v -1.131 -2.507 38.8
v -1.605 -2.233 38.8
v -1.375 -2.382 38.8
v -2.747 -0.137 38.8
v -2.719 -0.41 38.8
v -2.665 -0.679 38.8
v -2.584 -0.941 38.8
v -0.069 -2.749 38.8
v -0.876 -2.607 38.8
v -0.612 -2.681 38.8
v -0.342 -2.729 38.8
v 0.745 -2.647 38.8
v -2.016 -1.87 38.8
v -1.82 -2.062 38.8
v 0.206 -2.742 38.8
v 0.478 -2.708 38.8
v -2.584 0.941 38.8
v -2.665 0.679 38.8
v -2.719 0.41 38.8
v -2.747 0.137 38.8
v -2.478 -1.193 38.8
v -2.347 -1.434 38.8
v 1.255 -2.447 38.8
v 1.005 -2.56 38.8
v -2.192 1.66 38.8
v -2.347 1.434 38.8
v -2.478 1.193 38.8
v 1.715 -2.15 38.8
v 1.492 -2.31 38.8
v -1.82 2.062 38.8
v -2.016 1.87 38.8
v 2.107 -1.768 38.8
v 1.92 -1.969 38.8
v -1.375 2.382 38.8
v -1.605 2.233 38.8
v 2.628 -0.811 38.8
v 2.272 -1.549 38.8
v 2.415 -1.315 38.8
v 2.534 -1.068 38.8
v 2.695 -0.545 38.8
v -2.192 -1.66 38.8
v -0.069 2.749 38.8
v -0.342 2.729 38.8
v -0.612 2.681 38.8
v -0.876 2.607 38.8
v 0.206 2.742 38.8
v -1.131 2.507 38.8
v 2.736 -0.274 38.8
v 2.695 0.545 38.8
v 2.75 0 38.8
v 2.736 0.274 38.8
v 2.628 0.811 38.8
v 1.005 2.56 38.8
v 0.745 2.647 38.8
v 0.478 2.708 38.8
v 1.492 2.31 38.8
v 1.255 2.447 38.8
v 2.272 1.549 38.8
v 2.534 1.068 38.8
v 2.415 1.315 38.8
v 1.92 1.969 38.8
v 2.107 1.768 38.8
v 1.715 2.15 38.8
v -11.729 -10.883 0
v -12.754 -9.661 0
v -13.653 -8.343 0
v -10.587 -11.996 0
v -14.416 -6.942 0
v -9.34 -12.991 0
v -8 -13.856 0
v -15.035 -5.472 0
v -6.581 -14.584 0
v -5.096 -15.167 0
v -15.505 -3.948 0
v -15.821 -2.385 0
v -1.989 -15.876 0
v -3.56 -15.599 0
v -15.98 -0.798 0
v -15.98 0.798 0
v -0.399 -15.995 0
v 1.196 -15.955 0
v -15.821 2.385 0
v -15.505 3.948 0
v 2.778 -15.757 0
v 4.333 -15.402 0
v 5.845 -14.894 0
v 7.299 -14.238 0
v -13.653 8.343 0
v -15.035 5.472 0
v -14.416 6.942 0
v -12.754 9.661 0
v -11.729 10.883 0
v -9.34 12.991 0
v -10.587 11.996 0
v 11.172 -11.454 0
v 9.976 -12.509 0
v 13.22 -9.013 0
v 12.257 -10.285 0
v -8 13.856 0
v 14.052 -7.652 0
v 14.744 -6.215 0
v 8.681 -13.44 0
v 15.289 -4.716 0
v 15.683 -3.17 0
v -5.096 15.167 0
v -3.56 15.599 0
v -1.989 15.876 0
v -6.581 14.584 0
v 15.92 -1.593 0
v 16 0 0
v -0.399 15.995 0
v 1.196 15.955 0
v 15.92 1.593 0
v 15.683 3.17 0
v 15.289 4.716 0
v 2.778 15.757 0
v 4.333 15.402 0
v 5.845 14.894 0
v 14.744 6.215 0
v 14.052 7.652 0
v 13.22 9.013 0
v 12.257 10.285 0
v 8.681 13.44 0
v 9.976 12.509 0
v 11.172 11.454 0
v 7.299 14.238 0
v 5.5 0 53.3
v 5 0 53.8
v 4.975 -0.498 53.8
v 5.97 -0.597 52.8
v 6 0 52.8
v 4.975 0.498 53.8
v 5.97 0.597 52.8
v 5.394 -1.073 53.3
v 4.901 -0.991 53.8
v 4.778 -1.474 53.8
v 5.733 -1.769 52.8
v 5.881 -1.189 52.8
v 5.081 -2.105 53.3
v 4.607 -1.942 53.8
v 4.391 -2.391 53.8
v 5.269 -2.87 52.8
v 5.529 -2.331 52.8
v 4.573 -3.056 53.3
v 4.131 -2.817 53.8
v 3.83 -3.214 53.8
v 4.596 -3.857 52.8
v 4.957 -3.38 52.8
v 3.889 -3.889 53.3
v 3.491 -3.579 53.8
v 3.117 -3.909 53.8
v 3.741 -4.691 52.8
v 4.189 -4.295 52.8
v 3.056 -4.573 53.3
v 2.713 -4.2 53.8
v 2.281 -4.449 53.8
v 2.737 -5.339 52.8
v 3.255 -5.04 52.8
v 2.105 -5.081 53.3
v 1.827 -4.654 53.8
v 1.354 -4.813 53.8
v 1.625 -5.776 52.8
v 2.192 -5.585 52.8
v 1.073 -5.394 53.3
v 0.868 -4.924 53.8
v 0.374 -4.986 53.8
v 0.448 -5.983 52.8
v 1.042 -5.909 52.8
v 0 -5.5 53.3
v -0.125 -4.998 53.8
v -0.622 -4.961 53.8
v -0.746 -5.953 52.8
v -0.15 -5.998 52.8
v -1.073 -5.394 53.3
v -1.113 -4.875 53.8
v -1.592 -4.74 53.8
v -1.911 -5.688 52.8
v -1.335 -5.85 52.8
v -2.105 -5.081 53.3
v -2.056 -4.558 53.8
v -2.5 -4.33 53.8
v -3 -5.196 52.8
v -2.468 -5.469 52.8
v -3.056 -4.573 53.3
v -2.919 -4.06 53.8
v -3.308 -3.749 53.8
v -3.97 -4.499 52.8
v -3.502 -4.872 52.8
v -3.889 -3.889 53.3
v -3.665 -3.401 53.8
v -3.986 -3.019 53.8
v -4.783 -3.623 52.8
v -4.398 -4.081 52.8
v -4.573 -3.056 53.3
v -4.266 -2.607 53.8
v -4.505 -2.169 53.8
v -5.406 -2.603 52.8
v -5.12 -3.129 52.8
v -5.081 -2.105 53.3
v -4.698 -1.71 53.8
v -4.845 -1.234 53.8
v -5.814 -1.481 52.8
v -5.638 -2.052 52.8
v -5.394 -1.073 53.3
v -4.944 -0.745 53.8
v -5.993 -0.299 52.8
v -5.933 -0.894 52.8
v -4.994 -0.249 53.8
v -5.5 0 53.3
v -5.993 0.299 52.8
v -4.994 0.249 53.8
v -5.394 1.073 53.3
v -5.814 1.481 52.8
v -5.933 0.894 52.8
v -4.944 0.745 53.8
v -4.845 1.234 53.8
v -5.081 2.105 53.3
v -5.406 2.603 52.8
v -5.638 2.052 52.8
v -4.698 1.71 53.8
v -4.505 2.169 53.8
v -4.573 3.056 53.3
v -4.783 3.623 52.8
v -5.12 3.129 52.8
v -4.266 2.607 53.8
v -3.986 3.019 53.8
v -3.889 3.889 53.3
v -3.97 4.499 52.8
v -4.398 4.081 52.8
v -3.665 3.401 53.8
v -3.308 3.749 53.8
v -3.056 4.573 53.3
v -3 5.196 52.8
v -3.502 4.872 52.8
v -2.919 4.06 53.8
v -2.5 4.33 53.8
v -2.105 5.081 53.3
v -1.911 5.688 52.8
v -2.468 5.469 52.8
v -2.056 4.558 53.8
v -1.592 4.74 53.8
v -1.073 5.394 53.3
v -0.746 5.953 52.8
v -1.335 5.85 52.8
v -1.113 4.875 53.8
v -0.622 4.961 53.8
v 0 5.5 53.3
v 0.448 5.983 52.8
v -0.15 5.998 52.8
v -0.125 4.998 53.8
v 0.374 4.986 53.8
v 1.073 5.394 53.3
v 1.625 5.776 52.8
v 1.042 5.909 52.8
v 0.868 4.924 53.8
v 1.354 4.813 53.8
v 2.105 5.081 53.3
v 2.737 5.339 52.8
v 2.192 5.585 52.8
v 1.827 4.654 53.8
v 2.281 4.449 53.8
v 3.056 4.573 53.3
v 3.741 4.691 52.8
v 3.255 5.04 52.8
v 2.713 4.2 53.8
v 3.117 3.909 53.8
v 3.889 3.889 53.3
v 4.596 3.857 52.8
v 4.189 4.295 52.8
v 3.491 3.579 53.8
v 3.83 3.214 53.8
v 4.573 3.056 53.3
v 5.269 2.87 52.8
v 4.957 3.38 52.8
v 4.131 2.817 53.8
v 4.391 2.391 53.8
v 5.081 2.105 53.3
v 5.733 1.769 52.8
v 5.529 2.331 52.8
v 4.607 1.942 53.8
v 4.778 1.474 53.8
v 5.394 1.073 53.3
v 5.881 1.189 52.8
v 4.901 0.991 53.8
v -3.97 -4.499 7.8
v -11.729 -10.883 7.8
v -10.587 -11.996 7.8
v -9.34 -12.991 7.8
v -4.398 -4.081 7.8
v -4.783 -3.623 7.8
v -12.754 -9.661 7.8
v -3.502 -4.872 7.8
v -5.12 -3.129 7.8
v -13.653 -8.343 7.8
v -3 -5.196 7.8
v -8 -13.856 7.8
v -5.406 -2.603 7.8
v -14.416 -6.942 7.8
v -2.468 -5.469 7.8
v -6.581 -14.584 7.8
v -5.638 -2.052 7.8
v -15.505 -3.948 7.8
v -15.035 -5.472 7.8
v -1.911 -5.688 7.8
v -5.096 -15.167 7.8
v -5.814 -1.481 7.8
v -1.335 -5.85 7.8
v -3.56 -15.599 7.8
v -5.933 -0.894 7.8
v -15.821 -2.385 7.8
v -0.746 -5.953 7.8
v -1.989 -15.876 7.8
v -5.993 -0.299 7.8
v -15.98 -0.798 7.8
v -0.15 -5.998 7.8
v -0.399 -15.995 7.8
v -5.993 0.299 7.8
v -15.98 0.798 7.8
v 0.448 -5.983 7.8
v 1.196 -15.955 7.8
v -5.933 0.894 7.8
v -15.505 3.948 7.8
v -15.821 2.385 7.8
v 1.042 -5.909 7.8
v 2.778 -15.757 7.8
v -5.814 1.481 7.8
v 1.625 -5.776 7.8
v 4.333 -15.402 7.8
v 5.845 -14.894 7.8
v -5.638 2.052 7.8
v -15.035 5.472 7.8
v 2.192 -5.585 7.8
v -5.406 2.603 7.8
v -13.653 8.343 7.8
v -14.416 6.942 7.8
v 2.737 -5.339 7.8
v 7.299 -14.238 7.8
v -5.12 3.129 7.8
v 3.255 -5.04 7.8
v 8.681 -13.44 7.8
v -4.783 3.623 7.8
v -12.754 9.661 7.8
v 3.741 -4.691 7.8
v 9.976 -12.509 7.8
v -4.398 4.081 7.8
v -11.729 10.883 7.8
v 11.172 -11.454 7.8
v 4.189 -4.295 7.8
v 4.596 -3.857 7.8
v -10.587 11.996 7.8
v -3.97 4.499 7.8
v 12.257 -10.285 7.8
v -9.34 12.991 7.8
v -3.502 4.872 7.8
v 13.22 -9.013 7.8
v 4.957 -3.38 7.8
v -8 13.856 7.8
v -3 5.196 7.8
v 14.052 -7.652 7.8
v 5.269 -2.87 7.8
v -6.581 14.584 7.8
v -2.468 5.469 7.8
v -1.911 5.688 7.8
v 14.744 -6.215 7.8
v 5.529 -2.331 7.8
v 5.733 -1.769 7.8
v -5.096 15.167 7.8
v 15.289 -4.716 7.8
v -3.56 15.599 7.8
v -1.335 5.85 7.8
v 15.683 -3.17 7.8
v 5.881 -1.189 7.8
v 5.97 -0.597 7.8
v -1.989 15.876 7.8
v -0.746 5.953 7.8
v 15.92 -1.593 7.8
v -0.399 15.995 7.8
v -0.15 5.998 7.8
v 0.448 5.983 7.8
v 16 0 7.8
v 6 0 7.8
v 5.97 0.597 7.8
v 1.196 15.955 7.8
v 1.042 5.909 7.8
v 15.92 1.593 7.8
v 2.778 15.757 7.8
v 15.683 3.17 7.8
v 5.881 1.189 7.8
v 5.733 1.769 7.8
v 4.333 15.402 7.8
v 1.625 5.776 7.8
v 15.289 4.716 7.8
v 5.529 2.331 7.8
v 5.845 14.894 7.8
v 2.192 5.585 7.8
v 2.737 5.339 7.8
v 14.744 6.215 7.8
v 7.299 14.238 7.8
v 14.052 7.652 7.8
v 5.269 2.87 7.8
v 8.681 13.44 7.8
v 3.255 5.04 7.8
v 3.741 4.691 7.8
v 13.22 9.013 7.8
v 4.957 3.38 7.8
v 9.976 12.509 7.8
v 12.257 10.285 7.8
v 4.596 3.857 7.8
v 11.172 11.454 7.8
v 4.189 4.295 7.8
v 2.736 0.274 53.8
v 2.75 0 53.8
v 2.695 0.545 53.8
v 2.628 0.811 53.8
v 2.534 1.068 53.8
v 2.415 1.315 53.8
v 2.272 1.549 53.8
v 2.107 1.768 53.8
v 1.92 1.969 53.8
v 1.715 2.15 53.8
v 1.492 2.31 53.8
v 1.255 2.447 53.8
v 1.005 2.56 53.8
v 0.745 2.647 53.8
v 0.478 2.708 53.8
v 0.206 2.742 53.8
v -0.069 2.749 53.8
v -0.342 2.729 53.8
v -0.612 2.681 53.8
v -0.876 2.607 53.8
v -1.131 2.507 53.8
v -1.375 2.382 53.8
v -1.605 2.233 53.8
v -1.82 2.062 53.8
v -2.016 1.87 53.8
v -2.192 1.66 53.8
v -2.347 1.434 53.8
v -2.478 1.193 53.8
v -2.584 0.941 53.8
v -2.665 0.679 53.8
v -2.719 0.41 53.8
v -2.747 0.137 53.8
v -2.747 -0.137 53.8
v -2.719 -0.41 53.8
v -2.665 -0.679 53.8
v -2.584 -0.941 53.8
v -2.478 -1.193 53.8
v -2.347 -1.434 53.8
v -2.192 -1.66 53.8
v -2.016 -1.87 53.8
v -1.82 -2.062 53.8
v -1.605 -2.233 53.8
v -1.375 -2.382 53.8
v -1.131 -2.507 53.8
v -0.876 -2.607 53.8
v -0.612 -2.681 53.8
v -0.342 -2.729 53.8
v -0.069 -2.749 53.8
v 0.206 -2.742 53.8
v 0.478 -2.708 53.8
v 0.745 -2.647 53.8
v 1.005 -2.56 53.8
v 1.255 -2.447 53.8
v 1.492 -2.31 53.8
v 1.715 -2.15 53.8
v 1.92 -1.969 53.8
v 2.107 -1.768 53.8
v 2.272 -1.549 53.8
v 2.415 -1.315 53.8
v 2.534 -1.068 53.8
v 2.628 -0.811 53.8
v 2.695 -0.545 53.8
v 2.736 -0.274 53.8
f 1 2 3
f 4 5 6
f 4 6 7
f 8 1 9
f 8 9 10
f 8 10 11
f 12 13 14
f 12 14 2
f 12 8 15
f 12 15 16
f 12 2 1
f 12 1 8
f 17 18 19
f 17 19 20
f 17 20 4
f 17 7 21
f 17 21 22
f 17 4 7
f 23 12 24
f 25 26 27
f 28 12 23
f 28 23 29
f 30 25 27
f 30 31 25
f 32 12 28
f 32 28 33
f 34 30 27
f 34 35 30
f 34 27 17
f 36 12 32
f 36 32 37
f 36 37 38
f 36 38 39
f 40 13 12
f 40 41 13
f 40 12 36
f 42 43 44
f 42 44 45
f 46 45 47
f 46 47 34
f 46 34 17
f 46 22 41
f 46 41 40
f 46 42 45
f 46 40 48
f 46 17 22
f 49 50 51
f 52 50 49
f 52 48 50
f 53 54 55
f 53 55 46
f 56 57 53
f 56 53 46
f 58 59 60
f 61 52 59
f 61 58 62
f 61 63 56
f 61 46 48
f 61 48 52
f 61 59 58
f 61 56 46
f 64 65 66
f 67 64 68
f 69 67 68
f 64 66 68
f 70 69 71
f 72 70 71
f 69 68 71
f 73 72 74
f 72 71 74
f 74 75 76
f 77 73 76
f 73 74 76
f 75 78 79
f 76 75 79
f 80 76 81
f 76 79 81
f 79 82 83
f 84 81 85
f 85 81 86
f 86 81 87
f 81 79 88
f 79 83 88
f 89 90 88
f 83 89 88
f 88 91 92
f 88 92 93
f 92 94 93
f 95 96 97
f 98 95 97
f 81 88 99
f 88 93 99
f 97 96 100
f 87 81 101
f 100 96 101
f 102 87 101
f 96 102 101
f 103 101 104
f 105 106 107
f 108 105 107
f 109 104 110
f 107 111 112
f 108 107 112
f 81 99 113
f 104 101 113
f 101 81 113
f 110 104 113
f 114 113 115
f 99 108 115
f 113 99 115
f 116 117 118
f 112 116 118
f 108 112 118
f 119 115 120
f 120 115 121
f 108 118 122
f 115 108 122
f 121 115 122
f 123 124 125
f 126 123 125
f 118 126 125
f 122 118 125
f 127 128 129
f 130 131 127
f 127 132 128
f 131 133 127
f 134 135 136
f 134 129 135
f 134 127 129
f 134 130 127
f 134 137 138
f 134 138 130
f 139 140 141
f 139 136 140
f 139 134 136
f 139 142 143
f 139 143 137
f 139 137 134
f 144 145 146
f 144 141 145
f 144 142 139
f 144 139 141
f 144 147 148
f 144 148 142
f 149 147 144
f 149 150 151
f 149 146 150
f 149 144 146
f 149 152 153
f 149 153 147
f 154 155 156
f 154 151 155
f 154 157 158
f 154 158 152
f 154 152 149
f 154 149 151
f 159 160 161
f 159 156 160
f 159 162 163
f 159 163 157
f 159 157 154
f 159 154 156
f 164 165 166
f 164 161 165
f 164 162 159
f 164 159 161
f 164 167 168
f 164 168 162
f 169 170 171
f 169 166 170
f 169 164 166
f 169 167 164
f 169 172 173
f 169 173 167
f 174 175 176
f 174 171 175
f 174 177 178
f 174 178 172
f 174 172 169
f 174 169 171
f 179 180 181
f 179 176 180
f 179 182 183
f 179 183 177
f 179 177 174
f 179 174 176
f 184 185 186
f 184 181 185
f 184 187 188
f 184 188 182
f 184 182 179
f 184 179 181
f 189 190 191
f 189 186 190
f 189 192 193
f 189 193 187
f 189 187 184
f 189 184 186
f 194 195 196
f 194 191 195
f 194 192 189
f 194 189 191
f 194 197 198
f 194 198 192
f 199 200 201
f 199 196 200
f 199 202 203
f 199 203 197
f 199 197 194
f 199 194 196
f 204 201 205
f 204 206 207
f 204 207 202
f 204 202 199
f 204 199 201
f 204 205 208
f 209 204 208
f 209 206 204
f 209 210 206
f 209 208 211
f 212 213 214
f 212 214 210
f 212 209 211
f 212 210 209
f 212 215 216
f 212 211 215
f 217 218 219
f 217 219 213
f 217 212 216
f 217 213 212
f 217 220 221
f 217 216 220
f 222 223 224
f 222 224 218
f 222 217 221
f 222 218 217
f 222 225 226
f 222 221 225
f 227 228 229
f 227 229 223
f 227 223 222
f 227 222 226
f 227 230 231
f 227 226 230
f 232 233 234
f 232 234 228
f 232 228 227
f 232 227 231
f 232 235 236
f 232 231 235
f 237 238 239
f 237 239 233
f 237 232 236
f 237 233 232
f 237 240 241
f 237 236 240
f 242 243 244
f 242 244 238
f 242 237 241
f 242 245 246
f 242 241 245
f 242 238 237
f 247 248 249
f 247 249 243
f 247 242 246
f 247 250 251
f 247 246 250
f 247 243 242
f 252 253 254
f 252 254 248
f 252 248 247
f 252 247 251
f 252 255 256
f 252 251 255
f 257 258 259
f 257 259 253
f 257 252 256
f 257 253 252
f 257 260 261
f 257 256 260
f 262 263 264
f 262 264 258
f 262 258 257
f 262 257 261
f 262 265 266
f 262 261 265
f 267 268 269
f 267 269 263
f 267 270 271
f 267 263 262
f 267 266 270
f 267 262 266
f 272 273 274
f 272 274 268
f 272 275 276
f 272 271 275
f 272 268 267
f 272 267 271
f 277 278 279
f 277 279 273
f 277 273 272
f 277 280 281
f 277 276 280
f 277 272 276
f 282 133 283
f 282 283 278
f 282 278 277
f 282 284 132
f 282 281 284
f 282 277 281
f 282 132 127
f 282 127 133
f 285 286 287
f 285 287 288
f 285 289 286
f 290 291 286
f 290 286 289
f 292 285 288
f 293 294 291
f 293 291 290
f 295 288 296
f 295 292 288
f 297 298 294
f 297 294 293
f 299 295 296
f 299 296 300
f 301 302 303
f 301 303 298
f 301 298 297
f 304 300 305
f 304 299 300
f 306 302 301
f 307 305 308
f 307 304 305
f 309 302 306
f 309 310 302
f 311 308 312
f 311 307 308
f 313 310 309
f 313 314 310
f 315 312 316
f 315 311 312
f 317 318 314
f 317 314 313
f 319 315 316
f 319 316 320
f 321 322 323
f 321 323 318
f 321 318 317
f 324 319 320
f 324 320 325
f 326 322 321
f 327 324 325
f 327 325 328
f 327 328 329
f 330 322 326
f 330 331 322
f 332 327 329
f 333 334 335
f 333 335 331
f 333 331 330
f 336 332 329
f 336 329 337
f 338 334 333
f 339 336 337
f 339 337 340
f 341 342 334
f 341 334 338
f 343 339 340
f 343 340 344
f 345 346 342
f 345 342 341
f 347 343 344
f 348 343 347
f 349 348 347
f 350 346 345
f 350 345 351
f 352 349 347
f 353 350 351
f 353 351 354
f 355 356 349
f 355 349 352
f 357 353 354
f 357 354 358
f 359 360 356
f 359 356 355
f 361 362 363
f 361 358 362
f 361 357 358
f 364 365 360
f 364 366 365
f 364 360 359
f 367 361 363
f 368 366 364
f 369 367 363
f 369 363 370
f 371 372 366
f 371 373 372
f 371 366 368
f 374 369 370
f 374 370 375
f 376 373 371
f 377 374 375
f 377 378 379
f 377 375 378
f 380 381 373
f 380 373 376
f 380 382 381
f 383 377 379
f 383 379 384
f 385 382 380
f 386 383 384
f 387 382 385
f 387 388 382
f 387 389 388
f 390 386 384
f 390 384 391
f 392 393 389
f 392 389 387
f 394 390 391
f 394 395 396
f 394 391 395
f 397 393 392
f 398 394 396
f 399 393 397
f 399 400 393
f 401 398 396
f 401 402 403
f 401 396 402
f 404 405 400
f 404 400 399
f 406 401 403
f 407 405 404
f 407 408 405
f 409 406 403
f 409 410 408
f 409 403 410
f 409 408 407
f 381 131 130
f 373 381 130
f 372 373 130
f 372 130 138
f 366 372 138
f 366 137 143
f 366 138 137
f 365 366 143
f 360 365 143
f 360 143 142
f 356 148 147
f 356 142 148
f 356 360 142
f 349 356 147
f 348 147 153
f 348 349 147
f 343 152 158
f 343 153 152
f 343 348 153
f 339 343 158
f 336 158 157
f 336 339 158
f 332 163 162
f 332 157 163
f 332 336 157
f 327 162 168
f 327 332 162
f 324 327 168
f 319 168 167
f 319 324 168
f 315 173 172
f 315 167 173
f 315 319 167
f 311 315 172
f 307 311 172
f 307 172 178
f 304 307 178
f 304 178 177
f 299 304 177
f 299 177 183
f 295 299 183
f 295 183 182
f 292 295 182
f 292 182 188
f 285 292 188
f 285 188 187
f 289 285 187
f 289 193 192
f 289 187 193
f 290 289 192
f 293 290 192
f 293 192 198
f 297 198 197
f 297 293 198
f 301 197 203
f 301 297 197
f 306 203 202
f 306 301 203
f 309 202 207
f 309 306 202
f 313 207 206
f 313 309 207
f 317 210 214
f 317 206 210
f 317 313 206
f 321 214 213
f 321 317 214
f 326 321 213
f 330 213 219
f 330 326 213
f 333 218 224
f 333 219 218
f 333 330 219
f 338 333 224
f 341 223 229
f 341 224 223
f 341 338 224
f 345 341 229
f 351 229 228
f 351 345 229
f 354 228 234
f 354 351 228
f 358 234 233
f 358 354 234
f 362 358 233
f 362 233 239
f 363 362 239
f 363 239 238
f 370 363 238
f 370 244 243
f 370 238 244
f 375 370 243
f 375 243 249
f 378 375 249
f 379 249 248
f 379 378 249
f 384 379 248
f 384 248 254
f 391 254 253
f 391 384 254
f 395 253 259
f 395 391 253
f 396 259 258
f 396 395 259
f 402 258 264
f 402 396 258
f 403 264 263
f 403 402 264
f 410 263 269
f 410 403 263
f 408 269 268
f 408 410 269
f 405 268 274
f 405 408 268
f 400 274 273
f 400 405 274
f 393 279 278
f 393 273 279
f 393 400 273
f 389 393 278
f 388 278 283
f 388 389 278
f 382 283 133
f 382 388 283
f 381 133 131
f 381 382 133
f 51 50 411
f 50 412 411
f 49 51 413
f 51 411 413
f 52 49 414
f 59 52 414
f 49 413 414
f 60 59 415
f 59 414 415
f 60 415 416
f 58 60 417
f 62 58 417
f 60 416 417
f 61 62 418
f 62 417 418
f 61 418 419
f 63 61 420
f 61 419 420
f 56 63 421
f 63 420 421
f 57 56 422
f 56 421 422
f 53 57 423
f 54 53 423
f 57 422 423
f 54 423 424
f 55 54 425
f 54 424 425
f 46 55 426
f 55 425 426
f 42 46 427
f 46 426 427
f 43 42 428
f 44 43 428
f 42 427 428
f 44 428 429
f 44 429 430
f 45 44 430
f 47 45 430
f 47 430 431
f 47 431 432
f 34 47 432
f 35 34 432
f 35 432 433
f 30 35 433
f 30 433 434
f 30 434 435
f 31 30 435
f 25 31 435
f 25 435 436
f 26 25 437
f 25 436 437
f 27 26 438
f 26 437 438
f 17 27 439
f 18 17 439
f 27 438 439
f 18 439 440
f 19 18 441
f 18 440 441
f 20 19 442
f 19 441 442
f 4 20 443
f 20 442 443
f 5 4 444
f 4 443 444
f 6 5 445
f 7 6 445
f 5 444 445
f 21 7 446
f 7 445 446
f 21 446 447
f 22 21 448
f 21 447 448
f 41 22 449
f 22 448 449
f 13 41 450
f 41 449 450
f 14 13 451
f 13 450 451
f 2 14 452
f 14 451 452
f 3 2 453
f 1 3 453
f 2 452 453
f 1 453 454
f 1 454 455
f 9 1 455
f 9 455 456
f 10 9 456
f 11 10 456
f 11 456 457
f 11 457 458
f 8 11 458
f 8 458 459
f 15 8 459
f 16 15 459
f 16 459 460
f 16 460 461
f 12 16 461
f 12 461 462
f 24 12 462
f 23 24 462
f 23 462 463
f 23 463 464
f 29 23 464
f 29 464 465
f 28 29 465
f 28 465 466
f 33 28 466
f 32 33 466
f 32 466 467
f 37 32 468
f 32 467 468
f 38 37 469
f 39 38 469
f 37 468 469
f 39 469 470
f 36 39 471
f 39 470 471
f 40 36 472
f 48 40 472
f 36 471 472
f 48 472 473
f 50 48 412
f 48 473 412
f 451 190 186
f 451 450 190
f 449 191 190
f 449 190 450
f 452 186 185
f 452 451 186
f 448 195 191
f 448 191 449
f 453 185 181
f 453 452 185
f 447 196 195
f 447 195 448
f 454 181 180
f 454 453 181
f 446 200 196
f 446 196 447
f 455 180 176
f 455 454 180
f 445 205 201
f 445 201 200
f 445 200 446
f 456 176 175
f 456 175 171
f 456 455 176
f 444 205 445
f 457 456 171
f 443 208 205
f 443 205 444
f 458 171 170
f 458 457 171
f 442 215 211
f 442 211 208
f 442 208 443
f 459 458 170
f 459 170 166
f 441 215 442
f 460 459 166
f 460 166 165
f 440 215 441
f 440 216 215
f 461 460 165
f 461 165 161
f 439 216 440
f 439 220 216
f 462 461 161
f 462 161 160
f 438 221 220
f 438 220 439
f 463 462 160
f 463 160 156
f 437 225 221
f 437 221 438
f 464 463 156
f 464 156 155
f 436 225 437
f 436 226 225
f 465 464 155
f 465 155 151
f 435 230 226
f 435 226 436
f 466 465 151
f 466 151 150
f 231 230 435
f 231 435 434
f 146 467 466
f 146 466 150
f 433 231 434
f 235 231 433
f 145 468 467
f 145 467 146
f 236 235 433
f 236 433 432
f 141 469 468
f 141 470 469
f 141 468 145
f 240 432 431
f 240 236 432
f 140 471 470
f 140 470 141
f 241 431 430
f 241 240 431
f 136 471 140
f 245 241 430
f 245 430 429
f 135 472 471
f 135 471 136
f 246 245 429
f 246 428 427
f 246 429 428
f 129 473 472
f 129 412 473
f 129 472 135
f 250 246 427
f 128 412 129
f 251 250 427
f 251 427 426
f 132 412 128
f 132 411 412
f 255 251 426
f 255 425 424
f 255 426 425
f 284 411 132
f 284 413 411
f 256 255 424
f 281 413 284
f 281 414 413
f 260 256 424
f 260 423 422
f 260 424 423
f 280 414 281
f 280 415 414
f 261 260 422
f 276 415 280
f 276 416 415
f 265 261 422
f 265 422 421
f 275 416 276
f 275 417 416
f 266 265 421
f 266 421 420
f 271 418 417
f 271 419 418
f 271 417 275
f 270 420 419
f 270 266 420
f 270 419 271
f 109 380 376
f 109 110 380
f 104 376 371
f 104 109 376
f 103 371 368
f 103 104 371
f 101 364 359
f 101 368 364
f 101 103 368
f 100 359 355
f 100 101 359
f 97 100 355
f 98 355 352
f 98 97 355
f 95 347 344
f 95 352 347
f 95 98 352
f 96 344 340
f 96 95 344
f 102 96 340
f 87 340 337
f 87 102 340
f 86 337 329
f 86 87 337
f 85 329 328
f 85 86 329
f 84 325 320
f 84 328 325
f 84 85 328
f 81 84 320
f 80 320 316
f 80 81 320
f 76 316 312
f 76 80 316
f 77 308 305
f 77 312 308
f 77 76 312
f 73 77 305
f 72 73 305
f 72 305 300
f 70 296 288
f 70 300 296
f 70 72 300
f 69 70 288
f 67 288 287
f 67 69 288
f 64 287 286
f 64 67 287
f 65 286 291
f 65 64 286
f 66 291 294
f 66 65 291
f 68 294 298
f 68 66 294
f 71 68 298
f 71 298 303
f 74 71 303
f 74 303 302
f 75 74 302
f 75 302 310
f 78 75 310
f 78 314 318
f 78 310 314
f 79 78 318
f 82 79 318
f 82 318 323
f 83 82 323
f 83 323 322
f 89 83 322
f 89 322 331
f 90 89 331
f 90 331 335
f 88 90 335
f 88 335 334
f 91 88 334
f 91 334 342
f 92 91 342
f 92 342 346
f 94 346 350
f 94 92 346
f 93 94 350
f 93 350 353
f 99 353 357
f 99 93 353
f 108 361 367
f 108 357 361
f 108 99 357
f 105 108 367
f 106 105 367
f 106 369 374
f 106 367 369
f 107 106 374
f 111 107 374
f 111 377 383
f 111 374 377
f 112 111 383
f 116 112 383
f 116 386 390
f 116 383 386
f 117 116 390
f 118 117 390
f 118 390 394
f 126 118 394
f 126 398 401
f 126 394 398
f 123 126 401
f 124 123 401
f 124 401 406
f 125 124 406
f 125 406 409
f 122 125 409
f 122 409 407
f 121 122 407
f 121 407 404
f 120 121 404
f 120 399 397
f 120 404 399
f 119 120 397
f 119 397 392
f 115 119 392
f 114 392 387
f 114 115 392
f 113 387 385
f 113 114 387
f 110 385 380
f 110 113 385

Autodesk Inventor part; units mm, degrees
ref_plane "YZ Plane" through (0, 0, 0) normal (1, 0, 0) x (0, 1, 0)
ref_plane "XZ Plane" through (0, 0, 0) normal (0, 1, 0) x (-1, 0, 0)
ref_plane "XY Plane" through (0, 0, 0) normal (0, 0, 1) x (1, 0, 0)
sketch "Sketch1" plane through (0, 0, 0) normal (0, 0, 1) x (1, 0, 0)
  circle A0 centre (0, 0) radius 16
  dimension "d0" = 32
extrude "Extrusion1" add sketch "Sketch1" along normal blind 7.8
sketch "Sketch2" plane through (0, 0, 7.8) normal (0, 0, 1) x (1, 0, 0)
  circle A0 centre (0, 0) radius 16 projected
  circle A1 centre (0, 0) radius 6
  dimension "d3" = 12
extrude "Extrusion2" add sketch "Sketch2" along normal blind 46 contours A1
sketch "Sketch3" plane through (0, 0, 53.8) normal (0, 0, 1) x (1, 0, 0)
  circle A0 centre (0, 0) radius 6 projected
  circle A1 centre (0, 0) radius 2.75
  dimension "d6" = 5.5
extrude "Extrusion3" cut sketch "Sketch3" against normal blind 15 contours A1
chamfer "Chamfer1" distance 1 angle 45 1 edges at (-6, 0, 53.8)
properties part number "piston" material "Stainless Steel"
